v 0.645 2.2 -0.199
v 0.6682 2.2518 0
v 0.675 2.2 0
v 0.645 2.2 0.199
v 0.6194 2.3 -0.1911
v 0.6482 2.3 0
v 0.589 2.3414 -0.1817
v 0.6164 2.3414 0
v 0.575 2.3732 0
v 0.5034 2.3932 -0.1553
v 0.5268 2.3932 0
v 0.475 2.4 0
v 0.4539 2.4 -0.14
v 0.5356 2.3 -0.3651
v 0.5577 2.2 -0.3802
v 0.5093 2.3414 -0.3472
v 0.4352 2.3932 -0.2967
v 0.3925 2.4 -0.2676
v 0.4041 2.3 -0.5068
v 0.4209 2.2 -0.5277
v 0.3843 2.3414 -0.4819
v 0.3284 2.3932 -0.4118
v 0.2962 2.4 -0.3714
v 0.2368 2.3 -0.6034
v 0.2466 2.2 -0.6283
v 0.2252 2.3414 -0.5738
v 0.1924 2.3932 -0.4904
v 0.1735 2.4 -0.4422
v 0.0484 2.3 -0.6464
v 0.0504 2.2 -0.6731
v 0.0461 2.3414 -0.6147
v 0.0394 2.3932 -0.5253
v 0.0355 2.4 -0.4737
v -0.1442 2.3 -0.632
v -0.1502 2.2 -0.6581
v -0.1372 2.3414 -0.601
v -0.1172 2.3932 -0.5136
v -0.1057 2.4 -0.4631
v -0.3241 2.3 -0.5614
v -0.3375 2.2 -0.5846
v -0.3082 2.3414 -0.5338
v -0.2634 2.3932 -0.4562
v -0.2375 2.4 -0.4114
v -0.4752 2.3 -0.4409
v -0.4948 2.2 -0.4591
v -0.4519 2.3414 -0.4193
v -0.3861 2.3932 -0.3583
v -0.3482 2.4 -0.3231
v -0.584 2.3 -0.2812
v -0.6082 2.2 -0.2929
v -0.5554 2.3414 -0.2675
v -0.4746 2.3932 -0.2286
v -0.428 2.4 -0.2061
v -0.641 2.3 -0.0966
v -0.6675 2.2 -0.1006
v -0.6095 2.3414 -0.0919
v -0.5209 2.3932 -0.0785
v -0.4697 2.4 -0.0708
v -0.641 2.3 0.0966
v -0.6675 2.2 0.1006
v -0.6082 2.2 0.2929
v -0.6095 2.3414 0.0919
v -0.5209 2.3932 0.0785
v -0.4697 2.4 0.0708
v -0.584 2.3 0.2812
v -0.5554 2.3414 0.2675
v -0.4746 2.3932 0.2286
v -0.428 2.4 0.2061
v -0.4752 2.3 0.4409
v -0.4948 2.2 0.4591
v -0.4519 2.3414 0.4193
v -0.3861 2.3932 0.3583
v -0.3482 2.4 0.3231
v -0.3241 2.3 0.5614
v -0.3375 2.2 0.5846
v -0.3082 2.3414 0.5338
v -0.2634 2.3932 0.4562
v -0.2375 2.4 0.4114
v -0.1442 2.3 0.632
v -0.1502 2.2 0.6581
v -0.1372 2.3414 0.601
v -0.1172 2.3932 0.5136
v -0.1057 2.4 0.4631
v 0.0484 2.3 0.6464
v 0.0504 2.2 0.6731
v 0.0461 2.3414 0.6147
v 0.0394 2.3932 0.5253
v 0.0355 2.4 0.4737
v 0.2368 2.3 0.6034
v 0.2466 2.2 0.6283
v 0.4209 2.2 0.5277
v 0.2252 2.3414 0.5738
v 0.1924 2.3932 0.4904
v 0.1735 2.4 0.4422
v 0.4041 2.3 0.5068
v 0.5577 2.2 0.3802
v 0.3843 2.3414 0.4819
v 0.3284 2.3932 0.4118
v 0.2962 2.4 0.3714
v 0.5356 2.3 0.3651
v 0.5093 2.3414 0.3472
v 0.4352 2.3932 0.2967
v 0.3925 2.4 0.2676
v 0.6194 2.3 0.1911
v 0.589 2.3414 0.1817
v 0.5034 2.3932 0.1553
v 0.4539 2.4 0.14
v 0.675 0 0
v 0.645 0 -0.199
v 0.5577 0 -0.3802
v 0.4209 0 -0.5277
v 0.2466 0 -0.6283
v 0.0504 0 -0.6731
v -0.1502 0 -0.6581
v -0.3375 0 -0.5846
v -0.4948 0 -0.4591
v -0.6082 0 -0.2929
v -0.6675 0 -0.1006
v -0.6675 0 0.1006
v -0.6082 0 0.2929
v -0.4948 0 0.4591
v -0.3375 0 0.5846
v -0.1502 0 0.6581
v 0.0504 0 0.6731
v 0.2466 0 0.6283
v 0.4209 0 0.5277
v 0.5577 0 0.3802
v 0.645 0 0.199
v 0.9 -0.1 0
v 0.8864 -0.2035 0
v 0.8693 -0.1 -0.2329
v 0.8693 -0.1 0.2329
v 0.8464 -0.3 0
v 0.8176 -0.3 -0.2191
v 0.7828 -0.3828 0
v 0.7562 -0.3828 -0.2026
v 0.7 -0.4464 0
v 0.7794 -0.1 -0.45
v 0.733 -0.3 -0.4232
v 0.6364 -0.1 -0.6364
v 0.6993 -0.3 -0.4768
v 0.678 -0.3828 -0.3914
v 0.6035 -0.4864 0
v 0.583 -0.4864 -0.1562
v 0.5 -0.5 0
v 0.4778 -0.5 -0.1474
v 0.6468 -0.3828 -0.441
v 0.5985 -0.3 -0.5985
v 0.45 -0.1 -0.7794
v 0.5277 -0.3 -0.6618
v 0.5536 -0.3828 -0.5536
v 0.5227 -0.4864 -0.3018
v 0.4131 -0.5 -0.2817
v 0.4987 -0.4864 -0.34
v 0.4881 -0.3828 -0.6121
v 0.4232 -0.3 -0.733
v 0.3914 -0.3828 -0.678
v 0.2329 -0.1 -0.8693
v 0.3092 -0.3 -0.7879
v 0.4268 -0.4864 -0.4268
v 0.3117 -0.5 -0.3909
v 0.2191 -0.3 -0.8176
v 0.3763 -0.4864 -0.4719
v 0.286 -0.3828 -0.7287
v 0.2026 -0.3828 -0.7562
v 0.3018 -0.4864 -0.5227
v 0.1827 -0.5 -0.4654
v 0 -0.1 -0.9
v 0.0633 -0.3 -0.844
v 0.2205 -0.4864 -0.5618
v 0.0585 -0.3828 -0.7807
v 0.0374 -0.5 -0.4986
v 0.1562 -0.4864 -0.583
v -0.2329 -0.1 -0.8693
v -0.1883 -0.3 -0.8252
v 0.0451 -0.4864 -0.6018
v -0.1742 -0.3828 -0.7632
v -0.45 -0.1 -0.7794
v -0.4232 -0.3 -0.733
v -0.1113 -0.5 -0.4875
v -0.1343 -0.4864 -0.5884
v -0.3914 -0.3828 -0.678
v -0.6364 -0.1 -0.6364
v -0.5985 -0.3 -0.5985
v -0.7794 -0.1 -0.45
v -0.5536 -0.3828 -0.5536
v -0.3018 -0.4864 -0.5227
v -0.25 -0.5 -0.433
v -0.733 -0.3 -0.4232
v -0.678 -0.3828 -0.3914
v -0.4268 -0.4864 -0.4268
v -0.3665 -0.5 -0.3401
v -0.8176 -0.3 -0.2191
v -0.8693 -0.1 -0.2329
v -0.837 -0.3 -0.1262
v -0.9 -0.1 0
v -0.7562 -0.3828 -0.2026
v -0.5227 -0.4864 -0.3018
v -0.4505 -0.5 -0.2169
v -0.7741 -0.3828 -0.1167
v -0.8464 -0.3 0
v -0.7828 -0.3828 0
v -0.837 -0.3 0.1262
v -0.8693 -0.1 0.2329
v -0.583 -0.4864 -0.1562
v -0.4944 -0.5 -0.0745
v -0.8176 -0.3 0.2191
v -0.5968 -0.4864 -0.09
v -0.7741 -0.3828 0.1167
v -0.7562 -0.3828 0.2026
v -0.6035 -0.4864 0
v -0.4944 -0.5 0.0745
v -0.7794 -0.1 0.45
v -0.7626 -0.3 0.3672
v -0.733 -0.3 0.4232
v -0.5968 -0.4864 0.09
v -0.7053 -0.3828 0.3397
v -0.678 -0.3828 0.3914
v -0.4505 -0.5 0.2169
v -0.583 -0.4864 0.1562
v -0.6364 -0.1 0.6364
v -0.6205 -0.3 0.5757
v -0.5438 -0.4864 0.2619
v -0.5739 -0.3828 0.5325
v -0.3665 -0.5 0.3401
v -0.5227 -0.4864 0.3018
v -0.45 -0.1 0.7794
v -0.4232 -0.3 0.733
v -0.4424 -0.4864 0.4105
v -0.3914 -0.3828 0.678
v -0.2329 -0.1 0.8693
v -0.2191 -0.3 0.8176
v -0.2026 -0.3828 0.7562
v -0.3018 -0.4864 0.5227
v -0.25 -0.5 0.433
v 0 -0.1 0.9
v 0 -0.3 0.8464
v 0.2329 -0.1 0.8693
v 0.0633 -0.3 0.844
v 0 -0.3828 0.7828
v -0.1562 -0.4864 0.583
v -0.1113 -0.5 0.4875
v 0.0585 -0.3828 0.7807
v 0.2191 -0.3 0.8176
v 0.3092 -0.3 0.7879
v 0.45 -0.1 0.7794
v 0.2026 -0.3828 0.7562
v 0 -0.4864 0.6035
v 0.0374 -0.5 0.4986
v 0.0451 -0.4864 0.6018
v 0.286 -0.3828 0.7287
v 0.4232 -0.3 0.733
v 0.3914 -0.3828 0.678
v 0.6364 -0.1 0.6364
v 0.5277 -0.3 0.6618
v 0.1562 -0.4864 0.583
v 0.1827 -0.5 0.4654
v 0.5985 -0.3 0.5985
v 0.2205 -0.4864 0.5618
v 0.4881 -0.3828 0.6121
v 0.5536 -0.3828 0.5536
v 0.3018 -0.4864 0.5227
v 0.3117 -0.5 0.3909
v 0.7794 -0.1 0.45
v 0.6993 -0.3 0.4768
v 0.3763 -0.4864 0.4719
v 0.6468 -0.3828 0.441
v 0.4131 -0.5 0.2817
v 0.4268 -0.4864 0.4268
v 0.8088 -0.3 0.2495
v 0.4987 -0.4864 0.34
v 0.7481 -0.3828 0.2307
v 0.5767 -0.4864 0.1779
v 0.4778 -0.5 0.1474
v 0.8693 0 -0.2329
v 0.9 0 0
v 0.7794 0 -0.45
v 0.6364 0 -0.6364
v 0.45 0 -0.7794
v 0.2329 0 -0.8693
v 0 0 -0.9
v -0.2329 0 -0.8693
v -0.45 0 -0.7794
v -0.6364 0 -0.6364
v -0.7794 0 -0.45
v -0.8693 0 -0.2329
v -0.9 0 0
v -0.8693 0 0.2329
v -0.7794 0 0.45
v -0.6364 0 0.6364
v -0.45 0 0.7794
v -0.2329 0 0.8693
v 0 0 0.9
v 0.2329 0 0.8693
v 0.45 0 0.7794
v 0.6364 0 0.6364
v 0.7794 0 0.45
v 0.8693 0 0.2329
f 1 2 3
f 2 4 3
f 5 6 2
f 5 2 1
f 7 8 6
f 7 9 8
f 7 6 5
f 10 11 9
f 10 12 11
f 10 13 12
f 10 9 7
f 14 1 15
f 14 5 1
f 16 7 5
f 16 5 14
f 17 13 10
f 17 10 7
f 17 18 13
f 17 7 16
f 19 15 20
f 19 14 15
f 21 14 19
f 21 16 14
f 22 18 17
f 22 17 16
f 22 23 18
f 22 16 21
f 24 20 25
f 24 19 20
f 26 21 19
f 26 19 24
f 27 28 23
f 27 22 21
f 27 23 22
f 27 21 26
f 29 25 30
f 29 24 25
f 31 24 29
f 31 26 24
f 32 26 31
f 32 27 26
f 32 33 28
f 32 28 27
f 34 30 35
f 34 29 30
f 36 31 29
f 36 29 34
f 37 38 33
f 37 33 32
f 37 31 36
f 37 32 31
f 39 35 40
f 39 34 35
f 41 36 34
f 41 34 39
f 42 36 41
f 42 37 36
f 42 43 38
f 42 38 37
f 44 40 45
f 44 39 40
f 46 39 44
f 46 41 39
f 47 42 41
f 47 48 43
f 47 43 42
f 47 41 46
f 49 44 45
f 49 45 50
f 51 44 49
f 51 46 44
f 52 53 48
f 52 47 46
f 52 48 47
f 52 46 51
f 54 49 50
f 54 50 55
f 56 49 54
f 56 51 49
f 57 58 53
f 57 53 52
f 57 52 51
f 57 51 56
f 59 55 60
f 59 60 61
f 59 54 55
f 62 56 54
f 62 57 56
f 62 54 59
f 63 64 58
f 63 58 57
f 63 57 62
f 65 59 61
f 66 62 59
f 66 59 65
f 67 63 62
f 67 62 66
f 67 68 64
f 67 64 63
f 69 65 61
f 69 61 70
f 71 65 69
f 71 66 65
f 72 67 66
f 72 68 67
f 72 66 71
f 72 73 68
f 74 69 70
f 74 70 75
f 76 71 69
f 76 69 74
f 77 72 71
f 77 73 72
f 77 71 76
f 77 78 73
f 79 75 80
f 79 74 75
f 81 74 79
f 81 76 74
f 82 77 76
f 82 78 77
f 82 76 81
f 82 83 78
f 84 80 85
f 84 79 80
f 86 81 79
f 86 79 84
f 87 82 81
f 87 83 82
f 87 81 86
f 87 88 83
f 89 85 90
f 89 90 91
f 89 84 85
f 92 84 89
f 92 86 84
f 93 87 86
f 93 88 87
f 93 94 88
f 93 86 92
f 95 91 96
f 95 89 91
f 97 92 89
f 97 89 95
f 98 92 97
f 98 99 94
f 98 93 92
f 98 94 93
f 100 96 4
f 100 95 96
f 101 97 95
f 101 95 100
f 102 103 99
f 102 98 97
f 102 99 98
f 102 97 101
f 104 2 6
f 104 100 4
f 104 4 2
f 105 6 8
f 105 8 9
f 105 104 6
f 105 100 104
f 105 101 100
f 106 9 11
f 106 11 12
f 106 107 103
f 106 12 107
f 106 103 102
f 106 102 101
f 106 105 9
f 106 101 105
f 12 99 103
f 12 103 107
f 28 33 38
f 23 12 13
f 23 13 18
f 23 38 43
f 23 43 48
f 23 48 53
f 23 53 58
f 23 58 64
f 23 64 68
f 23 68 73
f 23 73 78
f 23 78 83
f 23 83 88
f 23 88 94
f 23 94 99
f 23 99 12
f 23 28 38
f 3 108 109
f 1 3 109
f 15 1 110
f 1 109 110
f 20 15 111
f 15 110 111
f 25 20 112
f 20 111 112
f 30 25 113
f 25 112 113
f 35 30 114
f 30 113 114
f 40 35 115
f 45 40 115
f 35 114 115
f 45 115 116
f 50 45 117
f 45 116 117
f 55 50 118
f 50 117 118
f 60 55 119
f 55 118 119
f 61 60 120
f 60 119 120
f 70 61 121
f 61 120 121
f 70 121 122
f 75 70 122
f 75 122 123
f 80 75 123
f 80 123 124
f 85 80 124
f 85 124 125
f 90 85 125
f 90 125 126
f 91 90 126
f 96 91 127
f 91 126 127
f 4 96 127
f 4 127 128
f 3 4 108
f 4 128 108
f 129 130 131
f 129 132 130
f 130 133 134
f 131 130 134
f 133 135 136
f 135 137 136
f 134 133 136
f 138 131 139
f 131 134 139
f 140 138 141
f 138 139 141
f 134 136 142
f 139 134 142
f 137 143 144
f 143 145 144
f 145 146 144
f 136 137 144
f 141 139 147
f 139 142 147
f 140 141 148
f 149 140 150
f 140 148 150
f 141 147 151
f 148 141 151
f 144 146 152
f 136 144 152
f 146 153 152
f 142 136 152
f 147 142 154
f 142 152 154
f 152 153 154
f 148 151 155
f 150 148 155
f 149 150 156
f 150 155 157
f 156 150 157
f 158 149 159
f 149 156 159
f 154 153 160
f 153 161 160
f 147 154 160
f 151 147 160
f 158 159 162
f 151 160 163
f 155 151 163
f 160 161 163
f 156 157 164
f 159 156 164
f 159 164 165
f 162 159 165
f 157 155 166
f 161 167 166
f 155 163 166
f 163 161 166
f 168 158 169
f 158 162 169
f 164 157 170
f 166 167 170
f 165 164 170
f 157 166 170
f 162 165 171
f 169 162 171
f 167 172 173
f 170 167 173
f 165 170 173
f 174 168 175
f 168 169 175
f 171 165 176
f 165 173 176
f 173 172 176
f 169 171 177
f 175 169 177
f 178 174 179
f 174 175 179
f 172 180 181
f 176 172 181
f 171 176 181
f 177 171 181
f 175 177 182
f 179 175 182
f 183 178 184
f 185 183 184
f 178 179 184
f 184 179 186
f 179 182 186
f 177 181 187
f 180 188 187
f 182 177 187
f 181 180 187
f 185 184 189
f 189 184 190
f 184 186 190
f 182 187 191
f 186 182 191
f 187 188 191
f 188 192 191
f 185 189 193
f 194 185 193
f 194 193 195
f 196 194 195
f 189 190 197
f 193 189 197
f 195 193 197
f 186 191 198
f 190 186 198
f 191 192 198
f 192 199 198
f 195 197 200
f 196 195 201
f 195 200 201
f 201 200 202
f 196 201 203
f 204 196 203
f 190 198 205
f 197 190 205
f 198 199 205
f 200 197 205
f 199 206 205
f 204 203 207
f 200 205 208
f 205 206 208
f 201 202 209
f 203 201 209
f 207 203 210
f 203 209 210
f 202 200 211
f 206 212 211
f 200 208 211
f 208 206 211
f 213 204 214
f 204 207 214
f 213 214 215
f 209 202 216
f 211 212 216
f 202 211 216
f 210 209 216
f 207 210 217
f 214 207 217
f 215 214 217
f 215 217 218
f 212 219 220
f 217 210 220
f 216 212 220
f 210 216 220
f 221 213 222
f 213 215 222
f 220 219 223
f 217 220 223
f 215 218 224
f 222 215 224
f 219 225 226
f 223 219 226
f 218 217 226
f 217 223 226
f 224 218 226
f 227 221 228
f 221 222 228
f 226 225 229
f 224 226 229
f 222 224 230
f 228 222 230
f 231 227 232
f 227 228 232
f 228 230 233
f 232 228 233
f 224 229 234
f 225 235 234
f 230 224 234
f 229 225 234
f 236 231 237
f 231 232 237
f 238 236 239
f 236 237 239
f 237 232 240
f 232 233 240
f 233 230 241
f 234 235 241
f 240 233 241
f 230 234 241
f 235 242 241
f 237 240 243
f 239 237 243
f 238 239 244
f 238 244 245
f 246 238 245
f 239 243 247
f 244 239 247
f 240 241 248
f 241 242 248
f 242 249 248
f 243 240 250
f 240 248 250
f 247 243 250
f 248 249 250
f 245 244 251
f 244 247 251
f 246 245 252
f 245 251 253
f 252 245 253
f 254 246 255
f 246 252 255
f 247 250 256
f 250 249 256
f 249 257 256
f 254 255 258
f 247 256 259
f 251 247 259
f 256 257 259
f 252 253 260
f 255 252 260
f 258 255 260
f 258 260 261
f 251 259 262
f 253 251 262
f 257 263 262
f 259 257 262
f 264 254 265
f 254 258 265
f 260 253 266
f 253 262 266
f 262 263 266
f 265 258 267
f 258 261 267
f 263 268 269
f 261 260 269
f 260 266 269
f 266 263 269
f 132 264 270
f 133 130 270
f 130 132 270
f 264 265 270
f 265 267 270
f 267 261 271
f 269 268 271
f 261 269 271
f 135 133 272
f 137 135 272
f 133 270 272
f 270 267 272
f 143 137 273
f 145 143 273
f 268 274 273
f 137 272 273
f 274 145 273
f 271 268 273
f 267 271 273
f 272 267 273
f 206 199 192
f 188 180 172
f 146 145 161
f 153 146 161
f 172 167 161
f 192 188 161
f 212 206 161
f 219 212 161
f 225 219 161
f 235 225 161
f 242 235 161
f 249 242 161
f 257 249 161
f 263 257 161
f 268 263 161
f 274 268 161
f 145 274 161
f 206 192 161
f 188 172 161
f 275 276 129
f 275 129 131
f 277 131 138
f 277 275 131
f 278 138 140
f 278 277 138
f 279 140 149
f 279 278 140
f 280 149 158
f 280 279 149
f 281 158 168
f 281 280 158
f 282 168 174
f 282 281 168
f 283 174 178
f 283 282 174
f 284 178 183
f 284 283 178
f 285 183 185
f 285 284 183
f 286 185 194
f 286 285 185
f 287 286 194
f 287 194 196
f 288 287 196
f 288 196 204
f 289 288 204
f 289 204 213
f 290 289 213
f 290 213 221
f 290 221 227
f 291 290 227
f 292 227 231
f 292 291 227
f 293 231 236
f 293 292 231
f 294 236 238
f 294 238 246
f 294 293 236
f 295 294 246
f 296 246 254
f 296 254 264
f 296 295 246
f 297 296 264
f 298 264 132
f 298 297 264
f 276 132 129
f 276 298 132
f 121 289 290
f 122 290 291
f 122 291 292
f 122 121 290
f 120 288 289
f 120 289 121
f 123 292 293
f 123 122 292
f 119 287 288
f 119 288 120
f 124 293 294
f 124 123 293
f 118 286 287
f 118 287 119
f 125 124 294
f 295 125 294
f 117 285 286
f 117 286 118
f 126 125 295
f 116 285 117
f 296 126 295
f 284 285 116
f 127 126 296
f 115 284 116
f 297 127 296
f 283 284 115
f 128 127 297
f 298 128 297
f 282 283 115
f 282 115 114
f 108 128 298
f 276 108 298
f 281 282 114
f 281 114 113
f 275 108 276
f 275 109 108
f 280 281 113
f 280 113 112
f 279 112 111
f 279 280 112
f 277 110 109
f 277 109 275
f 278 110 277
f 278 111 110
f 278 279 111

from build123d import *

# Parameters (mm, degrees)
SKETCH1_R           = 0.675
BOSS_EXTRUDE1_DEPTH = 2.4
SKETCH1_3_R         = 0.9
BOSS_EXTRUDE2_DEPTH = 0.5
FILLET1_R           = 0.4
FILLET2_R           = 0.2


with BuildPart() as part:
    # Sketch1 → Boss-Extrude1 (new body)
    with BuildSketch(Plane(origin=(0, 0, 0), x_dir=(1, 0, 0), z_dir=(0, 1, 0))):
        Circle(SKETCH1_R)
    extrude(amount=BOSS_EXTRUDE1_DEPTH)

    # Sketch1<3> → Boss-Extrude2 (add)
    with BuildSketch(Plane(origin=(0, 0, 0), x_dir=(1, 0, 0), z_dir=(0, 1, 0))):
        Circle(SKETCH1_3_R)
    extrude(amount=-BOSS_EXTRUDE2_DEPTH)

    # Fillet1
    fillet1_edges = [part.edges().sort_by_distance(p)[0] for p in [
        (-0.9, -0.5, 0),
    ]]
    fillet(fillet1_edges, radius=FILLET1_R)

    # Fillet2
    fillet2_edges = [part.edges().sort_by_distance(p)[0] for p in [
        (-0.675, 2.4, 0),
    ]]
    fillet(fillet2_edges, radius=FILLET2_R)


solid = part.part
